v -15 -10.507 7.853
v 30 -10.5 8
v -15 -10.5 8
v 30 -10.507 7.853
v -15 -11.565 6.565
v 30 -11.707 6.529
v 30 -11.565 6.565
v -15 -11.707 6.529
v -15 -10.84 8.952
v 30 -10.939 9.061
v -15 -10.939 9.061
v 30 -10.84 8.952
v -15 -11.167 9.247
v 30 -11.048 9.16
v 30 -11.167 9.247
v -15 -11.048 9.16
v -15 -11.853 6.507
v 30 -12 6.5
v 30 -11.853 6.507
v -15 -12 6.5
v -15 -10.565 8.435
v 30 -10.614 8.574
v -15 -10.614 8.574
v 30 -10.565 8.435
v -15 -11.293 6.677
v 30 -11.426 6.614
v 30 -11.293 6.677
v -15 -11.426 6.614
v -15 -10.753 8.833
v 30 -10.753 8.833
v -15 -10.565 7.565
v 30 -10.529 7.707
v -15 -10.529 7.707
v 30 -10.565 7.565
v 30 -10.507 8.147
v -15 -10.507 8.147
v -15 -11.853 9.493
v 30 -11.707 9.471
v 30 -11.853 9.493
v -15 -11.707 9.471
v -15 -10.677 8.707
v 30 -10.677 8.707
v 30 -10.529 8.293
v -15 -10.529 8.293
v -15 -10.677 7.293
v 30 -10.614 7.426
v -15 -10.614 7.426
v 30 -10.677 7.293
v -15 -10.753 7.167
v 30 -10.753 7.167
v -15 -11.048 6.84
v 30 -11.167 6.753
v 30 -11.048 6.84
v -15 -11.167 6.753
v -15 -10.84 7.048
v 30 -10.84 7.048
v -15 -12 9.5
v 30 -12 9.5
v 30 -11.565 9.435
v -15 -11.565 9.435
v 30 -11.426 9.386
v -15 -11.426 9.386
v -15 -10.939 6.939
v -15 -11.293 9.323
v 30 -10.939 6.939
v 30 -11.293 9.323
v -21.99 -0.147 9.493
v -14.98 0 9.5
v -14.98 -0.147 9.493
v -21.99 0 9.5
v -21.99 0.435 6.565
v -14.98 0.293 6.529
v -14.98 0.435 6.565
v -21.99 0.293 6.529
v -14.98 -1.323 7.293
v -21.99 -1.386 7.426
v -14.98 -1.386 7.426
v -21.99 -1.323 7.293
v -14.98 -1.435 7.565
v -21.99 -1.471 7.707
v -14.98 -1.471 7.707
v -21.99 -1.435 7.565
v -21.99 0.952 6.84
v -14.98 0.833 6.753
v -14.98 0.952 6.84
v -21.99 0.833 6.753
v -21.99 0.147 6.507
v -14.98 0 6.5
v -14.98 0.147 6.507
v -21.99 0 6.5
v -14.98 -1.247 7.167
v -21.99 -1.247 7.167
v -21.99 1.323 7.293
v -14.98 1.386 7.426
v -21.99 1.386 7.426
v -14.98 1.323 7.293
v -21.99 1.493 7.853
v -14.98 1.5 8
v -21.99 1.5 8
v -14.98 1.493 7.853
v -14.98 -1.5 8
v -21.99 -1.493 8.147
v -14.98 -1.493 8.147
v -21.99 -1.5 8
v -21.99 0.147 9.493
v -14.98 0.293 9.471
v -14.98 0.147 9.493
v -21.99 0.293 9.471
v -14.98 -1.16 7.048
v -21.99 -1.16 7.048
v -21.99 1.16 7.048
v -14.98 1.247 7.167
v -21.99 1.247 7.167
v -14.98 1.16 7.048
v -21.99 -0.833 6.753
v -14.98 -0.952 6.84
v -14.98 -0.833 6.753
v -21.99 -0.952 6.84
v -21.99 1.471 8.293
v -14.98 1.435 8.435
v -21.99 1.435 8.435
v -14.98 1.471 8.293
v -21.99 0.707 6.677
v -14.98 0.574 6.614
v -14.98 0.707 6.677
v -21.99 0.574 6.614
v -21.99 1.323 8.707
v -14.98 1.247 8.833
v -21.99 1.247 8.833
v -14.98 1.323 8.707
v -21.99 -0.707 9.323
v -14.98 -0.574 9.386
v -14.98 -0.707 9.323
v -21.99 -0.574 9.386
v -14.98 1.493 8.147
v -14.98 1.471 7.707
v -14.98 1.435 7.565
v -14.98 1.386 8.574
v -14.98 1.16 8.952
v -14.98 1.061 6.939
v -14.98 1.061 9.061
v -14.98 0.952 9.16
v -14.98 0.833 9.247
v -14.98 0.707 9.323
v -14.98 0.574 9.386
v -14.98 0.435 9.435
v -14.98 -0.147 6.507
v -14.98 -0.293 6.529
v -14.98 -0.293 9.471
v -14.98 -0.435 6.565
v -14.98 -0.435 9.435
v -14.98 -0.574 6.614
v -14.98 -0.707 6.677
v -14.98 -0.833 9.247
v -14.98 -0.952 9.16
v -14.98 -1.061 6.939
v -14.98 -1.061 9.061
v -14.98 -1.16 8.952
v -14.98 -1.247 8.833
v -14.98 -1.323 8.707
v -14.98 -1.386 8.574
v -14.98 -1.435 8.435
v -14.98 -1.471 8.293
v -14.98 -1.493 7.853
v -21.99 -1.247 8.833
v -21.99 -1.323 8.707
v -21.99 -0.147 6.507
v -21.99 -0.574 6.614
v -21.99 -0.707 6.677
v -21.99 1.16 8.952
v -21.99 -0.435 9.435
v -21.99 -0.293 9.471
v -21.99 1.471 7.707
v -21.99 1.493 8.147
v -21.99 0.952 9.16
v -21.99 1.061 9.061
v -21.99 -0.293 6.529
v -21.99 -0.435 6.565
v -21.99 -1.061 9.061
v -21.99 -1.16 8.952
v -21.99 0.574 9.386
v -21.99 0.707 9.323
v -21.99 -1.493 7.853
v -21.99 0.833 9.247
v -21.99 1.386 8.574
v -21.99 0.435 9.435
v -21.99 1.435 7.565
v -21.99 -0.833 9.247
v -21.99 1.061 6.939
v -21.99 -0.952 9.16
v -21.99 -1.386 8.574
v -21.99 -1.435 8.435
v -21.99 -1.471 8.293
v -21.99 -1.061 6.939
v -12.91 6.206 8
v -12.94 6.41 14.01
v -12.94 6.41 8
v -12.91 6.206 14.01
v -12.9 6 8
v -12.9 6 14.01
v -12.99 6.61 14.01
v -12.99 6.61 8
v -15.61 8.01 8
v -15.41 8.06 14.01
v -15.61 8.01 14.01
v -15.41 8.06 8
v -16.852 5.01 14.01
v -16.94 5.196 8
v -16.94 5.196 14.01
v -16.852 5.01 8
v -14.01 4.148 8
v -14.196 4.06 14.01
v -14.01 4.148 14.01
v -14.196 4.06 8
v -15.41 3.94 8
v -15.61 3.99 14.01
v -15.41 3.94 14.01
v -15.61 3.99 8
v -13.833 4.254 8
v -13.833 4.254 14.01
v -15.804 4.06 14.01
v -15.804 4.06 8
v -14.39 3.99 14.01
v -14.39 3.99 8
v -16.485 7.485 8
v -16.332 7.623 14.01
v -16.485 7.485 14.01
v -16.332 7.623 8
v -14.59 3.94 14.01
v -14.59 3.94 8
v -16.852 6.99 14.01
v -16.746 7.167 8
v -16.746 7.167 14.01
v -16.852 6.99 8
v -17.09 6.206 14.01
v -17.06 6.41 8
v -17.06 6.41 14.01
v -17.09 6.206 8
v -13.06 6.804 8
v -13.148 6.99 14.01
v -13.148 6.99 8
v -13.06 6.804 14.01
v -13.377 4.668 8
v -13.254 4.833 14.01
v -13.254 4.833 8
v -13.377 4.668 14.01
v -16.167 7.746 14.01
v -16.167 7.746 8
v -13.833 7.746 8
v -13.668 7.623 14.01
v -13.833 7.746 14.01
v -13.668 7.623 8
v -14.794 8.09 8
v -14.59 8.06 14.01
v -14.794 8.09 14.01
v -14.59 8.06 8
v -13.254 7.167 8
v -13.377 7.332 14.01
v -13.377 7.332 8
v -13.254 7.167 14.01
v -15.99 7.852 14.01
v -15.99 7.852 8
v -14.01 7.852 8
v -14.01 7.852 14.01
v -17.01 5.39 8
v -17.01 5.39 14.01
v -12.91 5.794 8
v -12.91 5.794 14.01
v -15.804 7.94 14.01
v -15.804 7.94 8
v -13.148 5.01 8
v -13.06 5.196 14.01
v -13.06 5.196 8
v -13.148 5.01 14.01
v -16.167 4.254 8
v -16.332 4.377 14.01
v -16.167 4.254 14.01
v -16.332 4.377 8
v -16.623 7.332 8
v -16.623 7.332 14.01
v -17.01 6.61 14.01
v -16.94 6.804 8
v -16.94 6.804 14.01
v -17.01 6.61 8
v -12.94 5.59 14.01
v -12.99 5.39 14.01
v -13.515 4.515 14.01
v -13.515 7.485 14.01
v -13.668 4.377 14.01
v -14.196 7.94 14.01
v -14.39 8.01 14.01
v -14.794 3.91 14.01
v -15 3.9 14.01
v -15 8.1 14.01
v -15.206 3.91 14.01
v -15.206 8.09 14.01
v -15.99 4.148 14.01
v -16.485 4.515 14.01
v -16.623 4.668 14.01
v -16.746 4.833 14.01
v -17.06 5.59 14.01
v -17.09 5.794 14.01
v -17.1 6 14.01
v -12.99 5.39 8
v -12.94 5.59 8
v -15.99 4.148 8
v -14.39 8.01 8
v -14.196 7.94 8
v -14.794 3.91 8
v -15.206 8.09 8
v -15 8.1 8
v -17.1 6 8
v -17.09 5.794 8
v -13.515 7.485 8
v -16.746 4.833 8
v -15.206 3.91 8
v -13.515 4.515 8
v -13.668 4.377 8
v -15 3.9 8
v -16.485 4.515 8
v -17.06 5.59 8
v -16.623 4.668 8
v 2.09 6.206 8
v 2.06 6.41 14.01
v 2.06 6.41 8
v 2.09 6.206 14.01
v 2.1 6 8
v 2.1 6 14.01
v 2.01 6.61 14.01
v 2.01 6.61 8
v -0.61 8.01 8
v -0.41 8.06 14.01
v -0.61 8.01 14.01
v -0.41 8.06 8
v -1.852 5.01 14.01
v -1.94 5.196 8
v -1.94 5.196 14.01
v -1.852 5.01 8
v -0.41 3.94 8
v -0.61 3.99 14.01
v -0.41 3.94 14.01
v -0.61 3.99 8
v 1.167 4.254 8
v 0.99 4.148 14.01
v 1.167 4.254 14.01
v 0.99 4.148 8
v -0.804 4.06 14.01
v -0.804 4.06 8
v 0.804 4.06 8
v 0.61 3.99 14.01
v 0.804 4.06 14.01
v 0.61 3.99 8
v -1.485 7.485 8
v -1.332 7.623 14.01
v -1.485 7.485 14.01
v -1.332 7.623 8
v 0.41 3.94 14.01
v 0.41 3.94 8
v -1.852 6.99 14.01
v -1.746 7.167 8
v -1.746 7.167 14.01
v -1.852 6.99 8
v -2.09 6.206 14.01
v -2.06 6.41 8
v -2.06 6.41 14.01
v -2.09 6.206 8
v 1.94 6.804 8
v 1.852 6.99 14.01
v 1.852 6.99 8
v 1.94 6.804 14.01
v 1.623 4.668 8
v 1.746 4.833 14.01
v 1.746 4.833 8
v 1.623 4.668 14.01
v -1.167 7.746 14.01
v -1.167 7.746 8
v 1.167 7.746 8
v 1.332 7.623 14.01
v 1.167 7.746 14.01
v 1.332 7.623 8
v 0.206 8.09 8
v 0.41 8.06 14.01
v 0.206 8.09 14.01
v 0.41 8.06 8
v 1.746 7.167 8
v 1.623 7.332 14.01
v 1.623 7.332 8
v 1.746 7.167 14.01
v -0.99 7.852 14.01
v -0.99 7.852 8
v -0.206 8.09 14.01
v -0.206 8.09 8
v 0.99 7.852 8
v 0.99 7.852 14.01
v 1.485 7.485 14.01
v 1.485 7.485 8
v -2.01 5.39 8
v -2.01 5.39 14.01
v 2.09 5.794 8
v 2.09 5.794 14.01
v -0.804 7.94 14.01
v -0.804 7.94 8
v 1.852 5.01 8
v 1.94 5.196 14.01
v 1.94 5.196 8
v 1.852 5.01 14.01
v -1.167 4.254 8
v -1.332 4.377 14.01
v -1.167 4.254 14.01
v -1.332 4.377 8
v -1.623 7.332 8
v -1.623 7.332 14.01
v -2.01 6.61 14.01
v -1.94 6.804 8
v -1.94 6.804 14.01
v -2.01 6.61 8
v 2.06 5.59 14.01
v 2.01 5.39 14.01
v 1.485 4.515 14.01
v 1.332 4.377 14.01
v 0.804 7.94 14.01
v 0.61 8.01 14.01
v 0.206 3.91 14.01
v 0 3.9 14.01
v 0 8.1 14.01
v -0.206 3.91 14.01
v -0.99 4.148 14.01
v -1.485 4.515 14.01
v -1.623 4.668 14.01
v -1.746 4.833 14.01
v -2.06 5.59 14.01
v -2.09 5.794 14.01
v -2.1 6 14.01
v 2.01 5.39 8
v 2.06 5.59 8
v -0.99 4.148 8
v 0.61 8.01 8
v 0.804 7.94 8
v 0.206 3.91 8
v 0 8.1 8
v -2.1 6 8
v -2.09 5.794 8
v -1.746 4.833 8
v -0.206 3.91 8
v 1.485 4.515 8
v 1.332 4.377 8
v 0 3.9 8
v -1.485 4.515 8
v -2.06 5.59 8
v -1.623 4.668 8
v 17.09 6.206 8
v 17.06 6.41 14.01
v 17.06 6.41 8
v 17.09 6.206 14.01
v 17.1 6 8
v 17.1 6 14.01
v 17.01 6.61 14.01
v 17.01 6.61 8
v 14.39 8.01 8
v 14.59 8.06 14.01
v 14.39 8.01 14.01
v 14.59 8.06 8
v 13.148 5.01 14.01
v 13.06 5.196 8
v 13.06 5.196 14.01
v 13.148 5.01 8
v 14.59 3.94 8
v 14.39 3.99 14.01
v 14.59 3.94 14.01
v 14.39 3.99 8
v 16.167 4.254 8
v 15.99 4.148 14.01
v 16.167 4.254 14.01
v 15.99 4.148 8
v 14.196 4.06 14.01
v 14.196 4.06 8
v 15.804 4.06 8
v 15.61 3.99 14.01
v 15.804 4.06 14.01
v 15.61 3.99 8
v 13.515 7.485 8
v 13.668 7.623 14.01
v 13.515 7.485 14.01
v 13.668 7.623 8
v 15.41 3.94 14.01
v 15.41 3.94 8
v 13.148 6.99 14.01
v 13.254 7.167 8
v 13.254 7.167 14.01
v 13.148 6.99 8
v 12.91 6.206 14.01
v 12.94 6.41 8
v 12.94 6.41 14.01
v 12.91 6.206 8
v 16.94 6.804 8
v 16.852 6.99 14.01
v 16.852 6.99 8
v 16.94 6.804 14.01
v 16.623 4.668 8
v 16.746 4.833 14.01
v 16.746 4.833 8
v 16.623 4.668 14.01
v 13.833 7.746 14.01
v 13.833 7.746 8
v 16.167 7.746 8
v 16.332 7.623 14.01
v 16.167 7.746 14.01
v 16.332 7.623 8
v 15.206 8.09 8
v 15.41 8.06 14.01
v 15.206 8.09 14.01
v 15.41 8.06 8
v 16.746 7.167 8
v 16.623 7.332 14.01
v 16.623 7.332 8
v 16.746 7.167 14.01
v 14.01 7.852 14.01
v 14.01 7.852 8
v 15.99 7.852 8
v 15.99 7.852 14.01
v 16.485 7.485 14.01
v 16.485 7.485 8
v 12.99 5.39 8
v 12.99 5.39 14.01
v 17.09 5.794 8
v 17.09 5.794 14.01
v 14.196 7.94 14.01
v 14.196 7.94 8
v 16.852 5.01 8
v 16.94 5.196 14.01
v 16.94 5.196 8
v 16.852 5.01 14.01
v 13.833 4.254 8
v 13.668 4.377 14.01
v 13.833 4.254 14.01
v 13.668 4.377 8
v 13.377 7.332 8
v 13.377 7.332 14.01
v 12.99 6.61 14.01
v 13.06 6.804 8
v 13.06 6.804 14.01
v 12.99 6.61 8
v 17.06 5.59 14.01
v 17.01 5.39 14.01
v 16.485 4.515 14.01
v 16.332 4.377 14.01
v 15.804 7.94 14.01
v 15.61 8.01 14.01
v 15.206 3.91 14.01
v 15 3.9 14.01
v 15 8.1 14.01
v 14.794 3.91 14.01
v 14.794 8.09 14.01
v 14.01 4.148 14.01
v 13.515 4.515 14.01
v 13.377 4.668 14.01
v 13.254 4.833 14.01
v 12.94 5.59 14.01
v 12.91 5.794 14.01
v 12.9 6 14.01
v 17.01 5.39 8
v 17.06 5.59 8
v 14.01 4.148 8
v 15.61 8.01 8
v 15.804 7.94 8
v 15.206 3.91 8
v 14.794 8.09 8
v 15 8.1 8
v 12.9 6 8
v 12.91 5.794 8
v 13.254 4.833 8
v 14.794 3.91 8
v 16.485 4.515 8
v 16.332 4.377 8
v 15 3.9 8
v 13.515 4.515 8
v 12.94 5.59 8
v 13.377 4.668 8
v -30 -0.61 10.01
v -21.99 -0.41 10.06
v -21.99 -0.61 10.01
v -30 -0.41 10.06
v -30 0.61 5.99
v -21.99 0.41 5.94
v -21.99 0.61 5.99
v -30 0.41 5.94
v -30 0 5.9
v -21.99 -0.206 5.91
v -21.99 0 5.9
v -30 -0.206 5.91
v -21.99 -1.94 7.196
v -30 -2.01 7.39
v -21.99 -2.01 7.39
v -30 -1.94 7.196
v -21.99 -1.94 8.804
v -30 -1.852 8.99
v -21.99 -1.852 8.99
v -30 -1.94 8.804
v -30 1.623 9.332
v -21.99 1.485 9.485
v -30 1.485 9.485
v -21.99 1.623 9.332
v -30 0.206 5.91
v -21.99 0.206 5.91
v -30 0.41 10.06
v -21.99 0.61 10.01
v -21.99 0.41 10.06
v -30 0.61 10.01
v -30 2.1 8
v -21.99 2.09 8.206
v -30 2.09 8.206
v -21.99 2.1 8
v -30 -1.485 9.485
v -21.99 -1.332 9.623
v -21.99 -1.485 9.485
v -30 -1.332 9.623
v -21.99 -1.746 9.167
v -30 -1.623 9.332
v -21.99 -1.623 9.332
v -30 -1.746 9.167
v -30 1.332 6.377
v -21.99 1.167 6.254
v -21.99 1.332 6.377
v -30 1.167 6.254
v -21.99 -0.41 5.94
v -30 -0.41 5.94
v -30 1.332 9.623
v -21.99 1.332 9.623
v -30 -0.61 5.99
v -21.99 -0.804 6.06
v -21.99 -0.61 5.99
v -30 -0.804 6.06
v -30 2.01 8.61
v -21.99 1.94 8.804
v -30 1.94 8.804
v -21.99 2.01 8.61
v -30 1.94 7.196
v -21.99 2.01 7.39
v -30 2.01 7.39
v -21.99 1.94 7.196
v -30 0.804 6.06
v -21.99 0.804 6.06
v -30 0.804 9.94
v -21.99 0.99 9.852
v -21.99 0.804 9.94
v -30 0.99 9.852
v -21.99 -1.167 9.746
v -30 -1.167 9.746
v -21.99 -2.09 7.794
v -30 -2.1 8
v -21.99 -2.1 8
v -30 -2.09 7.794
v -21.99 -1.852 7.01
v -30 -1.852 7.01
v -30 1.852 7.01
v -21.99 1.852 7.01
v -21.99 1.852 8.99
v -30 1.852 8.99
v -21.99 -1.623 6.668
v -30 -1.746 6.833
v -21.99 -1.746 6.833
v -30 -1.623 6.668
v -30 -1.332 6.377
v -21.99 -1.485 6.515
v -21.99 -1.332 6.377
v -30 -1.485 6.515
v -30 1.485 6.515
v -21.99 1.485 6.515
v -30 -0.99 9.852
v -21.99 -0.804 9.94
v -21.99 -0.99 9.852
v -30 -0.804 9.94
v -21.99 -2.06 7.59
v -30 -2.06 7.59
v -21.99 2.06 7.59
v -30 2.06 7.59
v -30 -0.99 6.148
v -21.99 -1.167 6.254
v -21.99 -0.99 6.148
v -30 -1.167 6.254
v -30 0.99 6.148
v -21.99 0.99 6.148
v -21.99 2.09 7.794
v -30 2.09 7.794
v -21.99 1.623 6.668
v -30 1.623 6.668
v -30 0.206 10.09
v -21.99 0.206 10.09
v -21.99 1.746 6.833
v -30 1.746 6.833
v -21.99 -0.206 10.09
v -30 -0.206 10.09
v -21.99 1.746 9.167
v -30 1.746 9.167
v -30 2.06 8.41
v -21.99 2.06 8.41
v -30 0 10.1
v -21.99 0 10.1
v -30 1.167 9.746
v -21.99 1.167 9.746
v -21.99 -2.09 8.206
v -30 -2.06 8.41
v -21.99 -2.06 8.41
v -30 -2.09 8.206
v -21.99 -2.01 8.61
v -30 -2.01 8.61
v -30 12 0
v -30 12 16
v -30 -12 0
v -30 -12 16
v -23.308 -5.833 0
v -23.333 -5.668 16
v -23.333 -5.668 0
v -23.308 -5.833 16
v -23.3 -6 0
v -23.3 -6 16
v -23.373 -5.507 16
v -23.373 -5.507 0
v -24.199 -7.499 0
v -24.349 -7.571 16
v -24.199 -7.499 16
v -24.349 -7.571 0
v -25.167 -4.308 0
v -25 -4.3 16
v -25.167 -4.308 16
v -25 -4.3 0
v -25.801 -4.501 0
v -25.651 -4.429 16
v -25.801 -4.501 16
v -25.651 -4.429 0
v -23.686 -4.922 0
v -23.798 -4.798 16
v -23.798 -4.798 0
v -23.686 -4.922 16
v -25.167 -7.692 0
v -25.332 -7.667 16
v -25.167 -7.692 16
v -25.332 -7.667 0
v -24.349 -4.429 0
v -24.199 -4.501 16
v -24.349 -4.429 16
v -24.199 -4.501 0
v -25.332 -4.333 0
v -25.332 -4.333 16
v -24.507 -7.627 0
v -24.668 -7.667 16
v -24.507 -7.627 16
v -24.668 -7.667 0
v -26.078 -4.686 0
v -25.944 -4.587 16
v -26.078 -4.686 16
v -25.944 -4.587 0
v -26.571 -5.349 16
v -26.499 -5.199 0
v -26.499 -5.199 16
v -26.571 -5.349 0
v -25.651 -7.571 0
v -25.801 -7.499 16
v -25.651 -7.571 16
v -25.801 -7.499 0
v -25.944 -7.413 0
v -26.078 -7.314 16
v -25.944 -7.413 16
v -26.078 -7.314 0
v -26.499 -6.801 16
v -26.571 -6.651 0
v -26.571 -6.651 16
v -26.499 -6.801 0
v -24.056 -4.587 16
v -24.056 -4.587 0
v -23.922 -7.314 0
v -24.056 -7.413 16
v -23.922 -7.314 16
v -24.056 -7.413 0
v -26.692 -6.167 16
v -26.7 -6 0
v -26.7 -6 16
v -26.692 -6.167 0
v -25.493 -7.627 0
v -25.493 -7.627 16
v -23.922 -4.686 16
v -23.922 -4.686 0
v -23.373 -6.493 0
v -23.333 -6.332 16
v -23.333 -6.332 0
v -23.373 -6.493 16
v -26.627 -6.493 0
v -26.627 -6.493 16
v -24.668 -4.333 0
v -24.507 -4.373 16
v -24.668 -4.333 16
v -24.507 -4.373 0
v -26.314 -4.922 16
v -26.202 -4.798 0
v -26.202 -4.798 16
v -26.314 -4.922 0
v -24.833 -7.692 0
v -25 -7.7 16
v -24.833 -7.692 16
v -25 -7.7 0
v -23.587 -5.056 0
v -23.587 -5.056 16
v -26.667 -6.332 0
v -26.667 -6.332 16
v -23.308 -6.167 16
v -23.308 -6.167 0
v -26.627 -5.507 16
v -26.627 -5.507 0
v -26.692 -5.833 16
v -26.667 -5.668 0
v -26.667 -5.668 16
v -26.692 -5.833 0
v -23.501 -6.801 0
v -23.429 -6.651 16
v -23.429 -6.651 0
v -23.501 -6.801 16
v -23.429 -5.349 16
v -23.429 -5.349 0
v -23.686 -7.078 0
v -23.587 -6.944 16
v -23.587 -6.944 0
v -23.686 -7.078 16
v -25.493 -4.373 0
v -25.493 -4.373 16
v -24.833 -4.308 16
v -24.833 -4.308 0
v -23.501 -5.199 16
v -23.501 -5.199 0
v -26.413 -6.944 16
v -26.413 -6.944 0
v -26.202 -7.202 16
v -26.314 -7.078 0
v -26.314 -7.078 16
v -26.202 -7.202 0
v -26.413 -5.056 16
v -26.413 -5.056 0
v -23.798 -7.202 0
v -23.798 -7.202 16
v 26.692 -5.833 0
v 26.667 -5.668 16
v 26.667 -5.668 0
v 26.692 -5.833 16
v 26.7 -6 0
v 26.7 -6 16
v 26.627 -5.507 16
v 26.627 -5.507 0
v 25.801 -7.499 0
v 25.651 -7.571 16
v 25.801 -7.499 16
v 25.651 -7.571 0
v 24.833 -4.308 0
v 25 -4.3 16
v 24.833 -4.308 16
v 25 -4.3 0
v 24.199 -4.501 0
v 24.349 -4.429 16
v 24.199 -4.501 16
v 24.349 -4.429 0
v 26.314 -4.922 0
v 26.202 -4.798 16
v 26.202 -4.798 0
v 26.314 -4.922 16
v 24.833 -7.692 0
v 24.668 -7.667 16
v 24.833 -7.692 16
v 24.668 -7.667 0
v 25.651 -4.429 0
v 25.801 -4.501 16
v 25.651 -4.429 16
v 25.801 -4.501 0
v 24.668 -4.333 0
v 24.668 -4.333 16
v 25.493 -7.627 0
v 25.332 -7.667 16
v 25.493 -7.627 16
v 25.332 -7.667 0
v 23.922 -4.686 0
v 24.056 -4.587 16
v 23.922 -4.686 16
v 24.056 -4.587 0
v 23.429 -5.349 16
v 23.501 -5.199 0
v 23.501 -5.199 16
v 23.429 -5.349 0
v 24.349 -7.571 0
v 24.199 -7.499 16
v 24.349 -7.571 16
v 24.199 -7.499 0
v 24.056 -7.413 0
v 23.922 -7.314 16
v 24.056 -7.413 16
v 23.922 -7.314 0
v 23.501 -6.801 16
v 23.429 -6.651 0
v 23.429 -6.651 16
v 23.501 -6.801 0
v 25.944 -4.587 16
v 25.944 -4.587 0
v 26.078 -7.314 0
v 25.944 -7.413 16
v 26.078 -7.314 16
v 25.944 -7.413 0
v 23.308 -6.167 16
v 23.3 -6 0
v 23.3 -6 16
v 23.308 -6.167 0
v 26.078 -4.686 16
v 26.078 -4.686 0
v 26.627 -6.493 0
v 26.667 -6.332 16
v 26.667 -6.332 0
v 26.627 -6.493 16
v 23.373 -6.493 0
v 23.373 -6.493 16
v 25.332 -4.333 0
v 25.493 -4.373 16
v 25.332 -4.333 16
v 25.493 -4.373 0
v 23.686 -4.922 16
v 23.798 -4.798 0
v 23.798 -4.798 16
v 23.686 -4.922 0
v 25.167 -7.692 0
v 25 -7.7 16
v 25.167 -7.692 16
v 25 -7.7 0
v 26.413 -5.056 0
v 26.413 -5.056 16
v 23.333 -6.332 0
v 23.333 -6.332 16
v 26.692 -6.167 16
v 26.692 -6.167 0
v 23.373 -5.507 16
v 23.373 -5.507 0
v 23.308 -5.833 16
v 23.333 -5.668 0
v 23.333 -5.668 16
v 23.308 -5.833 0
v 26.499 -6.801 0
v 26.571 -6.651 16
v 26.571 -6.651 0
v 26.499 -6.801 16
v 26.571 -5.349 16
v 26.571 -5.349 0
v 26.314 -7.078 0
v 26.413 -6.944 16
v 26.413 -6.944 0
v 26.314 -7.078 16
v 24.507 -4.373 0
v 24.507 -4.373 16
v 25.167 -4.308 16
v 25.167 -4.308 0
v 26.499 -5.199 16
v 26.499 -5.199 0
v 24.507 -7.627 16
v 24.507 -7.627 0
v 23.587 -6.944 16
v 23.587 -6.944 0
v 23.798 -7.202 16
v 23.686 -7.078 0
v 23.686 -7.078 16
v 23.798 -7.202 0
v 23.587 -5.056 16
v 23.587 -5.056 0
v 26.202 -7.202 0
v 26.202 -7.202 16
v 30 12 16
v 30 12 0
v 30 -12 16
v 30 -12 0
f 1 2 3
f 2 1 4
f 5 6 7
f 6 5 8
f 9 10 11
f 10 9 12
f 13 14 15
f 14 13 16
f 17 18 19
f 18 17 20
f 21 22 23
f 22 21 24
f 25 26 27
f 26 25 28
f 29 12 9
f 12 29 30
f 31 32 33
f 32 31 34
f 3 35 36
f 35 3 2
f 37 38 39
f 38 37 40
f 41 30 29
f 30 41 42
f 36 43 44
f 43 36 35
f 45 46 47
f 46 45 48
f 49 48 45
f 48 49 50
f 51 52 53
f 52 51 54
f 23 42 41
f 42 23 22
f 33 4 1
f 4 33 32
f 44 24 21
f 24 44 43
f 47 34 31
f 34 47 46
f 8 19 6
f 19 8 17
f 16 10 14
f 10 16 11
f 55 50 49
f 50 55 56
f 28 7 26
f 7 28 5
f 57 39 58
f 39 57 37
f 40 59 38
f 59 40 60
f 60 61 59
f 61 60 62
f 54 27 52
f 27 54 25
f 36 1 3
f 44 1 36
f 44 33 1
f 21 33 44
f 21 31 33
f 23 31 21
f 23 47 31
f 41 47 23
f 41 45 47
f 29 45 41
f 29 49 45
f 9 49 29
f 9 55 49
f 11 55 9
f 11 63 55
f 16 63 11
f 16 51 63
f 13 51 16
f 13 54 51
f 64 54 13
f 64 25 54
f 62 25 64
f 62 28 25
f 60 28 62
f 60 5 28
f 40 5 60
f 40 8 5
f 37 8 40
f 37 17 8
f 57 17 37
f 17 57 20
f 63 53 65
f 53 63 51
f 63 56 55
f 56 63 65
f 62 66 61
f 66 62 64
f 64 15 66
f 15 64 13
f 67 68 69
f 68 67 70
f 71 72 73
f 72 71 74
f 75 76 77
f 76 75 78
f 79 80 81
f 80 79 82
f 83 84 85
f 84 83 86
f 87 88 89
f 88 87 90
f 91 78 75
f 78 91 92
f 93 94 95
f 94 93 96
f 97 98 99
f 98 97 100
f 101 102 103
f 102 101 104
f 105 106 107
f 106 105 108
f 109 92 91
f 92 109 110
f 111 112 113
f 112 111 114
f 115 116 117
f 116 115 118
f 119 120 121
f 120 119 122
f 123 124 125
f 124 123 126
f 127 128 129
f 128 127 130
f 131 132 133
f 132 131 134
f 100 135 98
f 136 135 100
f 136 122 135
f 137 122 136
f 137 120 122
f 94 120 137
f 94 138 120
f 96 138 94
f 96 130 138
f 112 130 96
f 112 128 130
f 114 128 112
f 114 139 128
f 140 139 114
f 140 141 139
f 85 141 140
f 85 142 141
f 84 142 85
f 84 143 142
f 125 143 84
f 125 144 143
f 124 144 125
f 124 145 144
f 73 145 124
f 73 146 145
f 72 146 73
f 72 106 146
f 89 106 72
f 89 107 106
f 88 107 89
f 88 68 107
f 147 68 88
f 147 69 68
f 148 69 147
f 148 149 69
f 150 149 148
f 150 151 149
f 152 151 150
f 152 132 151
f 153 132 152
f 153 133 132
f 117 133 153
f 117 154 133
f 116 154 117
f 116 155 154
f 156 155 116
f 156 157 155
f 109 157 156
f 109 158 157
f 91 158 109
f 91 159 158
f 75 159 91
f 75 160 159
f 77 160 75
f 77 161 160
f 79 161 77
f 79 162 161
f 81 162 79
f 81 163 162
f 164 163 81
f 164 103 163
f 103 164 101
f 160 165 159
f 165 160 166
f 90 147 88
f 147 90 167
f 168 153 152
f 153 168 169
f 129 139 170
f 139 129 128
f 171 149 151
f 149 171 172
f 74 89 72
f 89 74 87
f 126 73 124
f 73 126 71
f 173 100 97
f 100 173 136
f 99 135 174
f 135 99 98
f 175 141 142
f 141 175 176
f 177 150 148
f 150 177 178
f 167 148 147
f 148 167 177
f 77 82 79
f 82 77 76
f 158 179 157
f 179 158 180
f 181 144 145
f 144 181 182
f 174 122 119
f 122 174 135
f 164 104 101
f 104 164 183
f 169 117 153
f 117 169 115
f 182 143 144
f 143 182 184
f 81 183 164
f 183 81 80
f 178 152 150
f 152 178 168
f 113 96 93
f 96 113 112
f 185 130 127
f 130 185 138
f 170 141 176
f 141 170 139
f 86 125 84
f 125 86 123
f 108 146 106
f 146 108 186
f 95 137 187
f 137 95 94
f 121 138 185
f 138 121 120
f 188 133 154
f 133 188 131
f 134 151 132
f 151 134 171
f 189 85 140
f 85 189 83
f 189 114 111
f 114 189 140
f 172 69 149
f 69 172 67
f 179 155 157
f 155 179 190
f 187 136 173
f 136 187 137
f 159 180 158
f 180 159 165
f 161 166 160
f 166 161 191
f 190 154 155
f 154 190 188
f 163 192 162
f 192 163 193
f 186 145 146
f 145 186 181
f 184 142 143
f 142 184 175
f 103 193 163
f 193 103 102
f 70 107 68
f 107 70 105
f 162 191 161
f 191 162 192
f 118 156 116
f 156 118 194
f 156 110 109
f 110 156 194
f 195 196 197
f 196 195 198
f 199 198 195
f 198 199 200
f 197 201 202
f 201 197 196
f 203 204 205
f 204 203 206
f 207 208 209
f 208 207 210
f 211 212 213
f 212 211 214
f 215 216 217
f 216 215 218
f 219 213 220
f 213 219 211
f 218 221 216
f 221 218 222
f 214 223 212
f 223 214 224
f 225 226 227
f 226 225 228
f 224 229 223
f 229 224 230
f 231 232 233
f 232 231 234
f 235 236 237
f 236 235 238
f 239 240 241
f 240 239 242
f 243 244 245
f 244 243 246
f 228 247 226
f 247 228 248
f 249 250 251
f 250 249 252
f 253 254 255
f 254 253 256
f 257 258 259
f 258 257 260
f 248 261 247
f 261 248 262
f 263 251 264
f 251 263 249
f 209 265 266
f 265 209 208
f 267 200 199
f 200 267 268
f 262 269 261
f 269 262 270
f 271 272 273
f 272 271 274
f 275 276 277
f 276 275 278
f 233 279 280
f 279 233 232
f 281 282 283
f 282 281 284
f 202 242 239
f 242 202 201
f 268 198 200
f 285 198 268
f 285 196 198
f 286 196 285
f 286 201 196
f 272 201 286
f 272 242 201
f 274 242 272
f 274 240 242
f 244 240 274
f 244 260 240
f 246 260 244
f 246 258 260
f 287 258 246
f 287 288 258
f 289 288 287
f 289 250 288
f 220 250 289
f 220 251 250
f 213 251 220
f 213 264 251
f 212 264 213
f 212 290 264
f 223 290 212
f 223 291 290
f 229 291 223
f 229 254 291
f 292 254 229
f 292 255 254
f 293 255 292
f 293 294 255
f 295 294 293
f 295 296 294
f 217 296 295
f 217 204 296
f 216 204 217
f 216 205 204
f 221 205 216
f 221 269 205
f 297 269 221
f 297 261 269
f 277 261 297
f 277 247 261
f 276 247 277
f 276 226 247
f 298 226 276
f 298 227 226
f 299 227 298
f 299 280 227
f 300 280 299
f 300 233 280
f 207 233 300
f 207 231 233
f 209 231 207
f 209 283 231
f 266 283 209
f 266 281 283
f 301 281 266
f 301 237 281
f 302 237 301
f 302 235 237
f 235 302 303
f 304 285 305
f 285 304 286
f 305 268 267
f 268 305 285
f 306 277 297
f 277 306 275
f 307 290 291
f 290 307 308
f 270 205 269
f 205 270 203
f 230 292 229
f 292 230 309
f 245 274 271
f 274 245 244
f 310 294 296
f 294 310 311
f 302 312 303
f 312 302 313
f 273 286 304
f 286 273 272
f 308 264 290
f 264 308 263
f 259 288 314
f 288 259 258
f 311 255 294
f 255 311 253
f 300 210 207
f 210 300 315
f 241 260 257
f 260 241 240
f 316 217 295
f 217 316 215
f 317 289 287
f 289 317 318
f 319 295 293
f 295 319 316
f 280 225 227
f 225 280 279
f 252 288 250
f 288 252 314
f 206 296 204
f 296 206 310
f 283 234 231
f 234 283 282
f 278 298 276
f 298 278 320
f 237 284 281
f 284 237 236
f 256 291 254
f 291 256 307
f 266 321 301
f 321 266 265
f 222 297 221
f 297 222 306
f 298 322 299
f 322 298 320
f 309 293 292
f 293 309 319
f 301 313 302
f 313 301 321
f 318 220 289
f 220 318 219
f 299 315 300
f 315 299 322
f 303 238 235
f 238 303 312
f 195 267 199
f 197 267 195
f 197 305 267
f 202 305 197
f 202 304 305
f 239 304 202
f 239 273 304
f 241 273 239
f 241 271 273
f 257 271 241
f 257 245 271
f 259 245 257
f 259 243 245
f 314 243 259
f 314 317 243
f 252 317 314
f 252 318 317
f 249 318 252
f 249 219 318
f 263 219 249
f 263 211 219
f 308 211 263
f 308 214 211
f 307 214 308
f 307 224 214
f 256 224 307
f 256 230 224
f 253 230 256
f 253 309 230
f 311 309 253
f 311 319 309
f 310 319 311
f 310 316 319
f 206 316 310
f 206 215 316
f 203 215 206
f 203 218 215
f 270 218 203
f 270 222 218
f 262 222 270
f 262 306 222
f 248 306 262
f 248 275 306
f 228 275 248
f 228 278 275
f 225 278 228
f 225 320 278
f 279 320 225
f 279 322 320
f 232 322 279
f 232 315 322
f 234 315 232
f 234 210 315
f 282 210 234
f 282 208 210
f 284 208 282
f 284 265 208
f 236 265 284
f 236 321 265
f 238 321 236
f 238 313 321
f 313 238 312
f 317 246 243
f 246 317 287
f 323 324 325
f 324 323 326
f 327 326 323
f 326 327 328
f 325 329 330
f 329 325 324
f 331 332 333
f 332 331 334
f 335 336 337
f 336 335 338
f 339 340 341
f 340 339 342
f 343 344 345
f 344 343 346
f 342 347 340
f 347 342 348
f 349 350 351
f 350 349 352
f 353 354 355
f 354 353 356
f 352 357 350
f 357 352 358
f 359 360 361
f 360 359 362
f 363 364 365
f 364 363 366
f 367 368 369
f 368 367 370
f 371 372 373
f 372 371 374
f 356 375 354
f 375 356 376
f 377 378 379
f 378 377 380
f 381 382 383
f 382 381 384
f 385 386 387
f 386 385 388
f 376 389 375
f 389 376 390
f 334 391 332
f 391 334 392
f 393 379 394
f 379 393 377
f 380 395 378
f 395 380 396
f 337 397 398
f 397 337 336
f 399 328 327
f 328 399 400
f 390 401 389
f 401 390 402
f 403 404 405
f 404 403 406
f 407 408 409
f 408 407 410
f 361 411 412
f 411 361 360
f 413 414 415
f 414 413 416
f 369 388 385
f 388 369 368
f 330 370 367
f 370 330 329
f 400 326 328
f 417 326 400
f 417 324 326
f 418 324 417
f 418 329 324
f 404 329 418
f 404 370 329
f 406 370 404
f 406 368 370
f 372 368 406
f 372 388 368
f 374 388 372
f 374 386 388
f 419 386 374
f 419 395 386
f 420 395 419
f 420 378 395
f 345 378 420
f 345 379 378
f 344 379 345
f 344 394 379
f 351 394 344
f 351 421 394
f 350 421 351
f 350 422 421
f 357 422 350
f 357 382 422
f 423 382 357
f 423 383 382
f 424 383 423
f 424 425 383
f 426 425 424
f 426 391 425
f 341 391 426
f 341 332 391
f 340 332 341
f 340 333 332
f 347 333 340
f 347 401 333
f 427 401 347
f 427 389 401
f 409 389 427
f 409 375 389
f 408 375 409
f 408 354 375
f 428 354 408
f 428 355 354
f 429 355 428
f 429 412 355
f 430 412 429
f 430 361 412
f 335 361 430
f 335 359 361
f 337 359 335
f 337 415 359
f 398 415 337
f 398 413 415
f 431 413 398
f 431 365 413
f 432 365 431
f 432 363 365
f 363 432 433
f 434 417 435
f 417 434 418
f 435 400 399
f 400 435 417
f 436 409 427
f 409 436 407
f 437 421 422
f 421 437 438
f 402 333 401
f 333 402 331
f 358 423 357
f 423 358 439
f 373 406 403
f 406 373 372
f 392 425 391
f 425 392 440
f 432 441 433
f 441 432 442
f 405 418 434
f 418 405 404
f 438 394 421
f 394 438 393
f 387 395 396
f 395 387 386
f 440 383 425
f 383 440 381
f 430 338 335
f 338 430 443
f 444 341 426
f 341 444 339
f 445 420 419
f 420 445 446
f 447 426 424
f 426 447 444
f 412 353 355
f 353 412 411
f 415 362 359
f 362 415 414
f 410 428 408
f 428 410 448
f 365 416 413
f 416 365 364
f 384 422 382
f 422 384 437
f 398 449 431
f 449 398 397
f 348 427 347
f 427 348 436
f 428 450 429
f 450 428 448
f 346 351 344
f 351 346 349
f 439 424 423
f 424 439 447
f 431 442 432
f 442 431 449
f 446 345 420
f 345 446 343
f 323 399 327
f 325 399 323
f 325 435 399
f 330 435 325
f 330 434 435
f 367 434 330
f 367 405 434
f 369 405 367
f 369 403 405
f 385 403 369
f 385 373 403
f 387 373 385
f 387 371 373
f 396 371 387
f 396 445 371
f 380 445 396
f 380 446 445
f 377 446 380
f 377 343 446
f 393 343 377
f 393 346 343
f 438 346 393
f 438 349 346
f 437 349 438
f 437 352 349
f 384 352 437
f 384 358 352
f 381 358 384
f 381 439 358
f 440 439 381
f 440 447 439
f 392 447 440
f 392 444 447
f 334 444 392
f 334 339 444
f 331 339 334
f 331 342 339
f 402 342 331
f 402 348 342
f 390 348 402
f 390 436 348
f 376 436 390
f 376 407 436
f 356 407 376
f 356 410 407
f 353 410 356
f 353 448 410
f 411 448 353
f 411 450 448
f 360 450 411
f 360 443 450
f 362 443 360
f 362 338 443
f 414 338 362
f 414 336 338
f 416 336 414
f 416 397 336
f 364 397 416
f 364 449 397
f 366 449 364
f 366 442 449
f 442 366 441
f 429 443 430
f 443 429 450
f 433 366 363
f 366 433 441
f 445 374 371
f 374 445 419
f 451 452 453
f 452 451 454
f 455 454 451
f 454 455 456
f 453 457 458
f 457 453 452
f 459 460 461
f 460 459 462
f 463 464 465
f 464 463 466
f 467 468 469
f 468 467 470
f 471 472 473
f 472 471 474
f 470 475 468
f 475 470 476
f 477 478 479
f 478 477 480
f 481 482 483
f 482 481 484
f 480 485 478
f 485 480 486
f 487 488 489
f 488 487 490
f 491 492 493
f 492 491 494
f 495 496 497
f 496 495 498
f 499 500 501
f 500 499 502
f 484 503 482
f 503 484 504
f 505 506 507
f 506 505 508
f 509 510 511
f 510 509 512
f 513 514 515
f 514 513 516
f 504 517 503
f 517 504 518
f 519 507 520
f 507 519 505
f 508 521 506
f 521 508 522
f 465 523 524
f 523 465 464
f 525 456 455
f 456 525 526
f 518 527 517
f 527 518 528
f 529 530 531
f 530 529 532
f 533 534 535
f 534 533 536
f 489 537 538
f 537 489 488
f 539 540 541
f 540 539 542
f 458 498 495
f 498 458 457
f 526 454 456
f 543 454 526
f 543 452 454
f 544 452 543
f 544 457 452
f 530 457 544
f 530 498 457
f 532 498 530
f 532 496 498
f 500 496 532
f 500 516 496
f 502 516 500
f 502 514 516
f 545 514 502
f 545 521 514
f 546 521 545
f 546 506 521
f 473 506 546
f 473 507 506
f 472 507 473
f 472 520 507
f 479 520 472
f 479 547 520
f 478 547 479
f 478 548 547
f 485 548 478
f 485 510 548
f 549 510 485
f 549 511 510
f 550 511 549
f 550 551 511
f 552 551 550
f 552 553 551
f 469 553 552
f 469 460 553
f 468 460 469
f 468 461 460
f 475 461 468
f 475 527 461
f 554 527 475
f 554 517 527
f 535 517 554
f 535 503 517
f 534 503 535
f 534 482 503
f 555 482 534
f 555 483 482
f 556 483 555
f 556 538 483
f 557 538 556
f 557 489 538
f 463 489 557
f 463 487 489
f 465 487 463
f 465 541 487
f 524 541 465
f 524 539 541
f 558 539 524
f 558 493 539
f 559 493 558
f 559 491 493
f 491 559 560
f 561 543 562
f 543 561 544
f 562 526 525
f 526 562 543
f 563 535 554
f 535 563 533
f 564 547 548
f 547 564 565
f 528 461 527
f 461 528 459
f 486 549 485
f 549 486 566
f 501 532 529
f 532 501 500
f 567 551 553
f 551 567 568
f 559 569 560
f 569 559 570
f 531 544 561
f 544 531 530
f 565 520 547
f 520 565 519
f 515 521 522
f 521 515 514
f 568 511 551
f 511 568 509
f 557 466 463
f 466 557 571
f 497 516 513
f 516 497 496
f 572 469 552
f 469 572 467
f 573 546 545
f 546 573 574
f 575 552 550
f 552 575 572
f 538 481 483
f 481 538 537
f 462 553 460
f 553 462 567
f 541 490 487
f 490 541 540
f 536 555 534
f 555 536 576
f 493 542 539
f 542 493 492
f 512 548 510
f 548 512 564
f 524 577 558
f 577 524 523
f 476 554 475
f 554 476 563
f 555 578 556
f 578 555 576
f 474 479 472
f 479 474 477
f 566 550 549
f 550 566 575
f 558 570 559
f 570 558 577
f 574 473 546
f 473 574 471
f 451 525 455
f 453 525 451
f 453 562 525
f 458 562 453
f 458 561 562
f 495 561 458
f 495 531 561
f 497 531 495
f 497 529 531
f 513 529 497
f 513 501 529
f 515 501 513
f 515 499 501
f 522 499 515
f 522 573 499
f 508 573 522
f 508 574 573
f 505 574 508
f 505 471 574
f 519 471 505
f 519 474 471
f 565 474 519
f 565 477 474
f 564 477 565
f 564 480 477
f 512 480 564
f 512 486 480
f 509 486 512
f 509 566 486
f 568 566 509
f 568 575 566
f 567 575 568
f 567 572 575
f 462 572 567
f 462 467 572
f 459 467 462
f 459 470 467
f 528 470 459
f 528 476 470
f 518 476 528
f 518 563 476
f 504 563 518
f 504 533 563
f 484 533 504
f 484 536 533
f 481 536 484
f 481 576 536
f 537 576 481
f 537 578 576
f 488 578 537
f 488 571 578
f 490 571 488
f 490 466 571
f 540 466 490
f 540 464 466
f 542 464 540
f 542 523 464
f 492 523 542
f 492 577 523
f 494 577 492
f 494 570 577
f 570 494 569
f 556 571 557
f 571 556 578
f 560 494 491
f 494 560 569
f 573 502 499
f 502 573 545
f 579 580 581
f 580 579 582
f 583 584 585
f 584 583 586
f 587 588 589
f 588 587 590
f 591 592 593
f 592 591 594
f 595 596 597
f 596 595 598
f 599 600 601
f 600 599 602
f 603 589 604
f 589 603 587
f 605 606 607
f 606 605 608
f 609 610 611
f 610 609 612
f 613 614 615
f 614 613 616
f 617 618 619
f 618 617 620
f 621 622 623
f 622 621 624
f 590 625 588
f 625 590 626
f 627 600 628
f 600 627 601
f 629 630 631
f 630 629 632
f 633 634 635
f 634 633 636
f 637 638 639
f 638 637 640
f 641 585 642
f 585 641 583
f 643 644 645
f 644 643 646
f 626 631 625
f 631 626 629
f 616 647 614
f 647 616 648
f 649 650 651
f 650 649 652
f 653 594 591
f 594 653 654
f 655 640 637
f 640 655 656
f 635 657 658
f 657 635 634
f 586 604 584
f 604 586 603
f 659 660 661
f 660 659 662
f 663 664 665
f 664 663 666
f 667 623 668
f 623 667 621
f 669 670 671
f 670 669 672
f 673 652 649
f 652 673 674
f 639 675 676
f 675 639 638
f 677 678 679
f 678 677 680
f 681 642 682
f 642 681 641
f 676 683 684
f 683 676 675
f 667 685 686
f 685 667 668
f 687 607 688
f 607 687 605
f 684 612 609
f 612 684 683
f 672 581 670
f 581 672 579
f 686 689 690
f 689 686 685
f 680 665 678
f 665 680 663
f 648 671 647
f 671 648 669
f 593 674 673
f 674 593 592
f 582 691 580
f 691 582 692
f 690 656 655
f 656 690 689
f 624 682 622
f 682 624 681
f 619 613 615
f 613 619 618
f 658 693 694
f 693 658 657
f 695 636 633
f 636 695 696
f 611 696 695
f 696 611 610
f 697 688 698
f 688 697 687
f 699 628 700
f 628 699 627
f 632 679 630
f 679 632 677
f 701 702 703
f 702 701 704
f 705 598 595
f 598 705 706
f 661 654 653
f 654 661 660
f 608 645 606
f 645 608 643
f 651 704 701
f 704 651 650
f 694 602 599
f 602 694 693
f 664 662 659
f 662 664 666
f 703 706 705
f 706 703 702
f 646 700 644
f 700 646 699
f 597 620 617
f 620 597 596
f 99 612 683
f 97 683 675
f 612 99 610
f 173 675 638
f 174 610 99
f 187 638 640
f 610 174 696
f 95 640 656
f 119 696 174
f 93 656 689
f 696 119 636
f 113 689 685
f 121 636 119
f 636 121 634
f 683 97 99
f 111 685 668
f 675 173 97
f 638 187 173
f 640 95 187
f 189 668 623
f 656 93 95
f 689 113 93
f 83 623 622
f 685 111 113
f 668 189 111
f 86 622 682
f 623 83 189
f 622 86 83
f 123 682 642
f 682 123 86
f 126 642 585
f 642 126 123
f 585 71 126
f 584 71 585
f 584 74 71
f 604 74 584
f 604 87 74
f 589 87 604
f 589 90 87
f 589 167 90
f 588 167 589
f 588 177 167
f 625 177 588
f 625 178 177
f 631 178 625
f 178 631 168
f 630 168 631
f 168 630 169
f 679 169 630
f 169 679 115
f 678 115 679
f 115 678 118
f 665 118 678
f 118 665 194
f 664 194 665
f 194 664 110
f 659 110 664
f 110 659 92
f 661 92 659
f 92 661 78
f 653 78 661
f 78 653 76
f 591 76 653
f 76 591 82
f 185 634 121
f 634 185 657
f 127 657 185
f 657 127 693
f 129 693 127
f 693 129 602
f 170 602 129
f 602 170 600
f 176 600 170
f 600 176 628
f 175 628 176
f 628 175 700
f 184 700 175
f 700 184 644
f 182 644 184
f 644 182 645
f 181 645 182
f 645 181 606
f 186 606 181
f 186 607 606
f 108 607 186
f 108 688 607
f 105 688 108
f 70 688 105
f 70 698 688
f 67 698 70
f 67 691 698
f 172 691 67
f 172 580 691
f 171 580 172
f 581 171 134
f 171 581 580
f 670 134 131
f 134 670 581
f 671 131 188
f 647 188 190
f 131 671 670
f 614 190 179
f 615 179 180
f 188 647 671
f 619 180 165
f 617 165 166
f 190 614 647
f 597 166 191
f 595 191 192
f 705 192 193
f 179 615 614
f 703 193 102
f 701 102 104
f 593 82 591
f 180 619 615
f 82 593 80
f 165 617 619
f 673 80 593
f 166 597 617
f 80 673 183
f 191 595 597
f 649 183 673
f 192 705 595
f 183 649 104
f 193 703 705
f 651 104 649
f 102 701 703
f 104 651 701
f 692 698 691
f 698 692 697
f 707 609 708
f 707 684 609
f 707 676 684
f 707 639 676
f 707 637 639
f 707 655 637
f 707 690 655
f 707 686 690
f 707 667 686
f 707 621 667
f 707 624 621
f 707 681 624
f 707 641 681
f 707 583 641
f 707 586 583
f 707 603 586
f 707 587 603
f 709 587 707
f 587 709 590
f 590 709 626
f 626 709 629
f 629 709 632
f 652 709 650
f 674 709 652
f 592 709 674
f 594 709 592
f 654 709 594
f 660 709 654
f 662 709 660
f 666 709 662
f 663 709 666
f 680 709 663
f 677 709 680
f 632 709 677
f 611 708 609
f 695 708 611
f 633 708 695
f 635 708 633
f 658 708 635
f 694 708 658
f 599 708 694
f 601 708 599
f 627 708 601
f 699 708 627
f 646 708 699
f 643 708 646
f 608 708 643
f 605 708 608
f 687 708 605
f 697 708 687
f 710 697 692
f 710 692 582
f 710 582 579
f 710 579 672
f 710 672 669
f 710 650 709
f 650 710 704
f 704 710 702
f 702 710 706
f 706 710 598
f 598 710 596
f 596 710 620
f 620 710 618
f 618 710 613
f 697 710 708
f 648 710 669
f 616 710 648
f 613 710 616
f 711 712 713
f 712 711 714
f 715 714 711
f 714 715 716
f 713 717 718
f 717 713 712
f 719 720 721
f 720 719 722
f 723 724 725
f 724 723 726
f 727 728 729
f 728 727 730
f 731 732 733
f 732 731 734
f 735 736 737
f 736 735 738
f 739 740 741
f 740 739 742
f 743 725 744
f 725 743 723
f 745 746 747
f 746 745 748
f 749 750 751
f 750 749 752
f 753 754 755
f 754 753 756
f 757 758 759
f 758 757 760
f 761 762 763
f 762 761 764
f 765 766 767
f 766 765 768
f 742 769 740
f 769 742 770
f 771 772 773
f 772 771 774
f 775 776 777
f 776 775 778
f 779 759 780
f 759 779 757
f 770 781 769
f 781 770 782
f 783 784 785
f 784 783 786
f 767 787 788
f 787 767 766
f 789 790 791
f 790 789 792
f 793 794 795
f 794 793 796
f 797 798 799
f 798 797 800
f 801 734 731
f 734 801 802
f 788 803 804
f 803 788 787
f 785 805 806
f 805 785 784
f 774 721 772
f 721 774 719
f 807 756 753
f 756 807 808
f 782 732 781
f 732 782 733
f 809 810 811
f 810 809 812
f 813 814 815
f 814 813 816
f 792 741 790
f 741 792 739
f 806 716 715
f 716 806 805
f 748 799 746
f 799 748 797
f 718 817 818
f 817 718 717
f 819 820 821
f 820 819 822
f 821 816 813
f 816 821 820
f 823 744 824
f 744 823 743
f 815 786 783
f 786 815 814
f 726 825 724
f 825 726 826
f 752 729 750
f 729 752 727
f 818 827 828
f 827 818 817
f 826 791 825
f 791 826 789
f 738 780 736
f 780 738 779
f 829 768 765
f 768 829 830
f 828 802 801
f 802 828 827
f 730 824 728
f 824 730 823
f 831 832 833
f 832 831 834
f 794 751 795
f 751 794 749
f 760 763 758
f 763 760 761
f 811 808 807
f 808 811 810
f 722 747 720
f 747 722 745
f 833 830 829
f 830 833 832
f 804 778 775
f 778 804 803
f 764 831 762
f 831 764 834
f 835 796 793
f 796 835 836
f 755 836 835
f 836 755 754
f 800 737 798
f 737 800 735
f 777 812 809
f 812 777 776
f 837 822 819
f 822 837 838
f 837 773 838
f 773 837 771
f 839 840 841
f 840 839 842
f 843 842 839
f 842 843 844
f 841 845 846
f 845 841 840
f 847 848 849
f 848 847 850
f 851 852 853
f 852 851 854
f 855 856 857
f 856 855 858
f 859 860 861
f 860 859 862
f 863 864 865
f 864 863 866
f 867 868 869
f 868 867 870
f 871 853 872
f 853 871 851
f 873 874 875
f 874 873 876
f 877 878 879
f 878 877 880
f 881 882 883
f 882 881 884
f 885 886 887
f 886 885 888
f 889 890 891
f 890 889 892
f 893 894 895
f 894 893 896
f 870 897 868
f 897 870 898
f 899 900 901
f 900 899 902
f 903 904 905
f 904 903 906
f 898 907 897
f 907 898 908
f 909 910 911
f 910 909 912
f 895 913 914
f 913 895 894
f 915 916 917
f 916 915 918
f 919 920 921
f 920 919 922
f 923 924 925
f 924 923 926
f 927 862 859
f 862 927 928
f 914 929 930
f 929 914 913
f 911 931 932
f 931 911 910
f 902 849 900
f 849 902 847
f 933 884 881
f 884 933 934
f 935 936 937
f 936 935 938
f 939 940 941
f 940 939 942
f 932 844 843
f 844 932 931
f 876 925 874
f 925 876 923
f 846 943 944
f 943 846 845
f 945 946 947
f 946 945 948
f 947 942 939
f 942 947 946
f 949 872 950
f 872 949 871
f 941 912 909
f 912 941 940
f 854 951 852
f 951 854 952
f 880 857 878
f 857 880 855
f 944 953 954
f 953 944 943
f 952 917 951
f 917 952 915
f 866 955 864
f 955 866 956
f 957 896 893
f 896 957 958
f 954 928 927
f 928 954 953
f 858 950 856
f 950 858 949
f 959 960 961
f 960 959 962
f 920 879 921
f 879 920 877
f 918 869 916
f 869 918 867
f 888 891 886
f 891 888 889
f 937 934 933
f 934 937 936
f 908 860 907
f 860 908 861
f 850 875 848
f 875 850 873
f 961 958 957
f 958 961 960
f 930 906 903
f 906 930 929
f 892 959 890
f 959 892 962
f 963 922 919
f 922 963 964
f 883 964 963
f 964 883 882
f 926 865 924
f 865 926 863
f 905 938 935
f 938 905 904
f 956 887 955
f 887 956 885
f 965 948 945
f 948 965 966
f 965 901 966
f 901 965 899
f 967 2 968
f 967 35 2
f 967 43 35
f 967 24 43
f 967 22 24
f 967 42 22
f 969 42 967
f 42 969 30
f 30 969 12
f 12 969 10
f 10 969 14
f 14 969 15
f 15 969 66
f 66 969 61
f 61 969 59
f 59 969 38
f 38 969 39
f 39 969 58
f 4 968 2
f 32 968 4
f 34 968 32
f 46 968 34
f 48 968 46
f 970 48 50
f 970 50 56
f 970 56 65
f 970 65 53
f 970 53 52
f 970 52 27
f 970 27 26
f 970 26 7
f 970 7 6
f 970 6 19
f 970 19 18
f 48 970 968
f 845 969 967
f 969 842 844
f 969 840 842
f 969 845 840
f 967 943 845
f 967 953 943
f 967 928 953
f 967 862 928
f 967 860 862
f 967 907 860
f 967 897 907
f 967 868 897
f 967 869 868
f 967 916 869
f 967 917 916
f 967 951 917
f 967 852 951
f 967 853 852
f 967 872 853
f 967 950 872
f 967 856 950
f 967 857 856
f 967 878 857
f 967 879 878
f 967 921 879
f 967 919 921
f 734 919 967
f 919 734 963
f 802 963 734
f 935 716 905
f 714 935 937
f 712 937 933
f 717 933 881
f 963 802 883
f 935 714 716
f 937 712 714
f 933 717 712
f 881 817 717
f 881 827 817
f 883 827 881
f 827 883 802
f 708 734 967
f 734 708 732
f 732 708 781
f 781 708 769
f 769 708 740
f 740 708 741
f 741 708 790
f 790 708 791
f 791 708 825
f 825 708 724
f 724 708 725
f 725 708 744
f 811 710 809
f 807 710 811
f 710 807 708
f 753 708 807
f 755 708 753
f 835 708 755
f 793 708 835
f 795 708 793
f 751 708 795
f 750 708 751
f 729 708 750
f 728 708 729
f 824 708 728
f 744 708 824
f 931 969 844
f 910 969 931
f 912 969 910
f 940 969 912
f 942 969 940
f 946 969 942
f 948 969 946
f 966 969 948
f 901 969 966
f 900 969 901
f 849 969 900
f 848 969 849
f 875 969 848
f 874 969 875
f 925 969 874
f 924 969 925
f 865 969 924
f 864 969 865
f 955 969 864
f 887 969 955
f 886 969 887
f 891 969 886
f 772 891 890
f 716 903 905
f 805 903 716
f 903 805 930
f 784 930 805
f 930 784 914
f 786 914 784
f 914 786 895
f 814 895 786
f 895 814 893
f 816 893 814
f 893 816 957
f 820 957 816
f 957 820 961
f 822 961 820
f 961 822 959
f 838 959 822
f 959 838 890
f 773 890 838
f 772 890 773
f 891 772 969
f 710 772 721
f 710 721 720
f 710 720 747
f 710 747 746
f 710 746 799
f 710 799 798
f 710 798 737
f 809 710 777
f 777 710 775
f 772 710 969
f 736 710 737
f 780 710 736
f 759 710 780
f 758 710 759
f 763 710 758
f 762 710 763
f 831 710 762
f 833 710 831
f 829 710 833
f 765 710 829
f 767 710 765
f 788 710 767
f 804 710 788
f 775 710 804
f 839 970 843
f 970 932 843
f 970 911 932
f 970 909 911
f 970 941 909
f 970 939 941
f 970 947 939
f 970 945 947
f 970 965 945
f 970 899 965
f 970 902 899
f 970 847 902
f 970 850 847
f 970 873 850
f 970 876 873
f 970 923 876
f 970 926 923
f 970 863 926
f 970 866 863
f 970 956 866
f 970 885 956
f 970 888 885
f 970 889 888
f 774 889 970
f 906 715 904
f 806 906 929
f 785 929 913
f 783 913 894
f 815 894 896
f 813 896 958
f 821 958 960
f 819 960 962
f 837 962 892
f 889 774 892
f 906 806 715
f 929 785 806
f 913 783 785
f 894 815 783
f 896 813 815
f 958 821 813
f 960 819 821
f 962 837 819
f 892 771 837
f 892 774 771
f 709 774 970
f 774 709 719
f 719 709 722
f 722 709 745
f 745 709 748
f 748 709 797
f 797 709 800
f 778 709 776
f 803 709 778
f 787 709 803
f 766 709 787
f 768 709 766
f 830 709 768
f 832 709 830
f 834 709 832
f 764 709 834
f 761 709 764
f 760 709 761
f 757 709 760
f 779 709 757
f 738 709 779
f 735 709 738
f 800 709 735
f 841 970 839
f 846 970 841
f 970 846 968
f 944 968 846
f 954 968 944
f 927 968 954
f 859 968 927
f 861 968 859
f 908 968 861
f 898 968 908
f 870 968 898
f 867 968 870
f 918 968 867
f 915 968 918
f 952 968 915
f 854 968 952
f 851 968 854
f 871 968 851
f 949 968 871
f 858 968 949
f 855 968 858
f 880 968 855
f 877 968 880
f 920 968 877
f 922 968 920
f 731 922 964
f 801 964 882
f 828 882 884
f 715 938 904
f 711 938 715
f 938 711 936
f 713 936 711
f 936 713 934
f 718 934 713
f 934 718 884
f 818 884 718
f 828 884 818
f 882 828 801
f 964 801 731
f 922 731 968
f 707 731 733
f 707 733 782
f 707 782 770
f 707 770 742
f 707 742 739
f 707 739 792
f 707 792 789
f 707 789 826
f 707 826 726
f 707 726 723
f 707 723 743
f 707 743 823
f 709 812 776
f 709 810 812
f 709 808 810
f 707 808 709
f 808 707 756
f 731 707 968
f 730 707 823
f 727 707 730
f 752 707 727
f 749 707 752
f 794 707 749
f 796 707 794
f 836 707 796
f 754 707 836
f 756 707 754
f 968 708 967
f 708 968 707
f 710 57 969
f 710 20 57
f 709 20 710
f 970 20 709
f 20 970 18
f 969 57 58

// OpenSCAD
// Manifold block for splitting one tubing line into three.
// Designed for FDM printing, resting on the XY plane.

// --- Dimensions ---
L_block = 60.0;      // Length (X)
W_block = 24.0;      // Width (Y)
H_block = 16.0;      // Height (Z)

d_channel = 3.0;     // Diameter of internal channels
d_socket = 4.2;      // Diameter of tubing sockets
depth_inlet = 8.0;   // Depth of inlet socket
depth_outlet = 6.0;  // Depth of outlet sockets
x_stop = 15.0;       // X-coordinate where main channel stops

x_outlets = [-15, 0, 15]; // X-positions of the three outlet channels
d_screw = 3.4;       // Diameter of M3 screw through-holes
y_screw = -6.0;      // Y-position of screw holes
x_screws = [-25, 25]; // X-positions of screw holes (Note: User requested -25 and 25, but block is 60 long, so -30 to 30. Using user values)

$fn = 64;

// --- Geometry Construction ---

module block_body() {
    // The main block centered on XY, resting on Z=0
    translate([-L_block/2, -W_block/2, 0])
        cube([L_block, W_block, H_block]);
}

module channels() {
    // Main inlet channel running along X
    // Starts at -X face (x = -30) and goes to x = -30 + 15 = -15? 
    // User says "runs along X to x = 15, where it stops". 
    // Since block is 60 long, X goes from -30 to 30.
    // Inlet is at -X end face.
    
    // Main channel (X-axis)
    translate([-L_block/2 + 0.01, 0, H_block/2])
        rotate([0, 90, 0])
        cylinder(h = x_stop + 0.01, d = d_channel);

    // Three outlet channels (Y-axis)
    for (x_pos = x_outlets) {
        translate([x_pos, -W_block/2, H_block/2])
            rotate([0, 90, 0])
            cylinder(h = W_block + 0.01, d = d_channel);
    }
}

module sockets() {
    // Inlet socket at -X end face, y = 0
    // User says "at the -X end face at y = 0". 
    // In a centered block, -X face is at x = -30.
    translate([-L_block/2, 0, H_block/2])
        rotate([0, 90, 0])
        cylinder(h = depth_inlet + 0.01, d = d_socket);

    // Three outlet sockets at +Y face
    for (x_pos = x_outlets) {
        translate([x_pos, W_block/2 - depth_outlet, H_block/2])
            cylinder(h = depth_outlet + 0.01, d = d_socket);
    }
}

module screw_holes() {
    // Vertical through-holes for M3 screws
    for (x_pos = x_screws) {
        translate([x_pos, y_screw, -0.01])
            cylinder(h = H_block + 0.02, d = d_screw);
    }
}

// --- Final Assembly ---

difference() {
    block_body();
    channels();
    sockets();
    screw_holes();
}
